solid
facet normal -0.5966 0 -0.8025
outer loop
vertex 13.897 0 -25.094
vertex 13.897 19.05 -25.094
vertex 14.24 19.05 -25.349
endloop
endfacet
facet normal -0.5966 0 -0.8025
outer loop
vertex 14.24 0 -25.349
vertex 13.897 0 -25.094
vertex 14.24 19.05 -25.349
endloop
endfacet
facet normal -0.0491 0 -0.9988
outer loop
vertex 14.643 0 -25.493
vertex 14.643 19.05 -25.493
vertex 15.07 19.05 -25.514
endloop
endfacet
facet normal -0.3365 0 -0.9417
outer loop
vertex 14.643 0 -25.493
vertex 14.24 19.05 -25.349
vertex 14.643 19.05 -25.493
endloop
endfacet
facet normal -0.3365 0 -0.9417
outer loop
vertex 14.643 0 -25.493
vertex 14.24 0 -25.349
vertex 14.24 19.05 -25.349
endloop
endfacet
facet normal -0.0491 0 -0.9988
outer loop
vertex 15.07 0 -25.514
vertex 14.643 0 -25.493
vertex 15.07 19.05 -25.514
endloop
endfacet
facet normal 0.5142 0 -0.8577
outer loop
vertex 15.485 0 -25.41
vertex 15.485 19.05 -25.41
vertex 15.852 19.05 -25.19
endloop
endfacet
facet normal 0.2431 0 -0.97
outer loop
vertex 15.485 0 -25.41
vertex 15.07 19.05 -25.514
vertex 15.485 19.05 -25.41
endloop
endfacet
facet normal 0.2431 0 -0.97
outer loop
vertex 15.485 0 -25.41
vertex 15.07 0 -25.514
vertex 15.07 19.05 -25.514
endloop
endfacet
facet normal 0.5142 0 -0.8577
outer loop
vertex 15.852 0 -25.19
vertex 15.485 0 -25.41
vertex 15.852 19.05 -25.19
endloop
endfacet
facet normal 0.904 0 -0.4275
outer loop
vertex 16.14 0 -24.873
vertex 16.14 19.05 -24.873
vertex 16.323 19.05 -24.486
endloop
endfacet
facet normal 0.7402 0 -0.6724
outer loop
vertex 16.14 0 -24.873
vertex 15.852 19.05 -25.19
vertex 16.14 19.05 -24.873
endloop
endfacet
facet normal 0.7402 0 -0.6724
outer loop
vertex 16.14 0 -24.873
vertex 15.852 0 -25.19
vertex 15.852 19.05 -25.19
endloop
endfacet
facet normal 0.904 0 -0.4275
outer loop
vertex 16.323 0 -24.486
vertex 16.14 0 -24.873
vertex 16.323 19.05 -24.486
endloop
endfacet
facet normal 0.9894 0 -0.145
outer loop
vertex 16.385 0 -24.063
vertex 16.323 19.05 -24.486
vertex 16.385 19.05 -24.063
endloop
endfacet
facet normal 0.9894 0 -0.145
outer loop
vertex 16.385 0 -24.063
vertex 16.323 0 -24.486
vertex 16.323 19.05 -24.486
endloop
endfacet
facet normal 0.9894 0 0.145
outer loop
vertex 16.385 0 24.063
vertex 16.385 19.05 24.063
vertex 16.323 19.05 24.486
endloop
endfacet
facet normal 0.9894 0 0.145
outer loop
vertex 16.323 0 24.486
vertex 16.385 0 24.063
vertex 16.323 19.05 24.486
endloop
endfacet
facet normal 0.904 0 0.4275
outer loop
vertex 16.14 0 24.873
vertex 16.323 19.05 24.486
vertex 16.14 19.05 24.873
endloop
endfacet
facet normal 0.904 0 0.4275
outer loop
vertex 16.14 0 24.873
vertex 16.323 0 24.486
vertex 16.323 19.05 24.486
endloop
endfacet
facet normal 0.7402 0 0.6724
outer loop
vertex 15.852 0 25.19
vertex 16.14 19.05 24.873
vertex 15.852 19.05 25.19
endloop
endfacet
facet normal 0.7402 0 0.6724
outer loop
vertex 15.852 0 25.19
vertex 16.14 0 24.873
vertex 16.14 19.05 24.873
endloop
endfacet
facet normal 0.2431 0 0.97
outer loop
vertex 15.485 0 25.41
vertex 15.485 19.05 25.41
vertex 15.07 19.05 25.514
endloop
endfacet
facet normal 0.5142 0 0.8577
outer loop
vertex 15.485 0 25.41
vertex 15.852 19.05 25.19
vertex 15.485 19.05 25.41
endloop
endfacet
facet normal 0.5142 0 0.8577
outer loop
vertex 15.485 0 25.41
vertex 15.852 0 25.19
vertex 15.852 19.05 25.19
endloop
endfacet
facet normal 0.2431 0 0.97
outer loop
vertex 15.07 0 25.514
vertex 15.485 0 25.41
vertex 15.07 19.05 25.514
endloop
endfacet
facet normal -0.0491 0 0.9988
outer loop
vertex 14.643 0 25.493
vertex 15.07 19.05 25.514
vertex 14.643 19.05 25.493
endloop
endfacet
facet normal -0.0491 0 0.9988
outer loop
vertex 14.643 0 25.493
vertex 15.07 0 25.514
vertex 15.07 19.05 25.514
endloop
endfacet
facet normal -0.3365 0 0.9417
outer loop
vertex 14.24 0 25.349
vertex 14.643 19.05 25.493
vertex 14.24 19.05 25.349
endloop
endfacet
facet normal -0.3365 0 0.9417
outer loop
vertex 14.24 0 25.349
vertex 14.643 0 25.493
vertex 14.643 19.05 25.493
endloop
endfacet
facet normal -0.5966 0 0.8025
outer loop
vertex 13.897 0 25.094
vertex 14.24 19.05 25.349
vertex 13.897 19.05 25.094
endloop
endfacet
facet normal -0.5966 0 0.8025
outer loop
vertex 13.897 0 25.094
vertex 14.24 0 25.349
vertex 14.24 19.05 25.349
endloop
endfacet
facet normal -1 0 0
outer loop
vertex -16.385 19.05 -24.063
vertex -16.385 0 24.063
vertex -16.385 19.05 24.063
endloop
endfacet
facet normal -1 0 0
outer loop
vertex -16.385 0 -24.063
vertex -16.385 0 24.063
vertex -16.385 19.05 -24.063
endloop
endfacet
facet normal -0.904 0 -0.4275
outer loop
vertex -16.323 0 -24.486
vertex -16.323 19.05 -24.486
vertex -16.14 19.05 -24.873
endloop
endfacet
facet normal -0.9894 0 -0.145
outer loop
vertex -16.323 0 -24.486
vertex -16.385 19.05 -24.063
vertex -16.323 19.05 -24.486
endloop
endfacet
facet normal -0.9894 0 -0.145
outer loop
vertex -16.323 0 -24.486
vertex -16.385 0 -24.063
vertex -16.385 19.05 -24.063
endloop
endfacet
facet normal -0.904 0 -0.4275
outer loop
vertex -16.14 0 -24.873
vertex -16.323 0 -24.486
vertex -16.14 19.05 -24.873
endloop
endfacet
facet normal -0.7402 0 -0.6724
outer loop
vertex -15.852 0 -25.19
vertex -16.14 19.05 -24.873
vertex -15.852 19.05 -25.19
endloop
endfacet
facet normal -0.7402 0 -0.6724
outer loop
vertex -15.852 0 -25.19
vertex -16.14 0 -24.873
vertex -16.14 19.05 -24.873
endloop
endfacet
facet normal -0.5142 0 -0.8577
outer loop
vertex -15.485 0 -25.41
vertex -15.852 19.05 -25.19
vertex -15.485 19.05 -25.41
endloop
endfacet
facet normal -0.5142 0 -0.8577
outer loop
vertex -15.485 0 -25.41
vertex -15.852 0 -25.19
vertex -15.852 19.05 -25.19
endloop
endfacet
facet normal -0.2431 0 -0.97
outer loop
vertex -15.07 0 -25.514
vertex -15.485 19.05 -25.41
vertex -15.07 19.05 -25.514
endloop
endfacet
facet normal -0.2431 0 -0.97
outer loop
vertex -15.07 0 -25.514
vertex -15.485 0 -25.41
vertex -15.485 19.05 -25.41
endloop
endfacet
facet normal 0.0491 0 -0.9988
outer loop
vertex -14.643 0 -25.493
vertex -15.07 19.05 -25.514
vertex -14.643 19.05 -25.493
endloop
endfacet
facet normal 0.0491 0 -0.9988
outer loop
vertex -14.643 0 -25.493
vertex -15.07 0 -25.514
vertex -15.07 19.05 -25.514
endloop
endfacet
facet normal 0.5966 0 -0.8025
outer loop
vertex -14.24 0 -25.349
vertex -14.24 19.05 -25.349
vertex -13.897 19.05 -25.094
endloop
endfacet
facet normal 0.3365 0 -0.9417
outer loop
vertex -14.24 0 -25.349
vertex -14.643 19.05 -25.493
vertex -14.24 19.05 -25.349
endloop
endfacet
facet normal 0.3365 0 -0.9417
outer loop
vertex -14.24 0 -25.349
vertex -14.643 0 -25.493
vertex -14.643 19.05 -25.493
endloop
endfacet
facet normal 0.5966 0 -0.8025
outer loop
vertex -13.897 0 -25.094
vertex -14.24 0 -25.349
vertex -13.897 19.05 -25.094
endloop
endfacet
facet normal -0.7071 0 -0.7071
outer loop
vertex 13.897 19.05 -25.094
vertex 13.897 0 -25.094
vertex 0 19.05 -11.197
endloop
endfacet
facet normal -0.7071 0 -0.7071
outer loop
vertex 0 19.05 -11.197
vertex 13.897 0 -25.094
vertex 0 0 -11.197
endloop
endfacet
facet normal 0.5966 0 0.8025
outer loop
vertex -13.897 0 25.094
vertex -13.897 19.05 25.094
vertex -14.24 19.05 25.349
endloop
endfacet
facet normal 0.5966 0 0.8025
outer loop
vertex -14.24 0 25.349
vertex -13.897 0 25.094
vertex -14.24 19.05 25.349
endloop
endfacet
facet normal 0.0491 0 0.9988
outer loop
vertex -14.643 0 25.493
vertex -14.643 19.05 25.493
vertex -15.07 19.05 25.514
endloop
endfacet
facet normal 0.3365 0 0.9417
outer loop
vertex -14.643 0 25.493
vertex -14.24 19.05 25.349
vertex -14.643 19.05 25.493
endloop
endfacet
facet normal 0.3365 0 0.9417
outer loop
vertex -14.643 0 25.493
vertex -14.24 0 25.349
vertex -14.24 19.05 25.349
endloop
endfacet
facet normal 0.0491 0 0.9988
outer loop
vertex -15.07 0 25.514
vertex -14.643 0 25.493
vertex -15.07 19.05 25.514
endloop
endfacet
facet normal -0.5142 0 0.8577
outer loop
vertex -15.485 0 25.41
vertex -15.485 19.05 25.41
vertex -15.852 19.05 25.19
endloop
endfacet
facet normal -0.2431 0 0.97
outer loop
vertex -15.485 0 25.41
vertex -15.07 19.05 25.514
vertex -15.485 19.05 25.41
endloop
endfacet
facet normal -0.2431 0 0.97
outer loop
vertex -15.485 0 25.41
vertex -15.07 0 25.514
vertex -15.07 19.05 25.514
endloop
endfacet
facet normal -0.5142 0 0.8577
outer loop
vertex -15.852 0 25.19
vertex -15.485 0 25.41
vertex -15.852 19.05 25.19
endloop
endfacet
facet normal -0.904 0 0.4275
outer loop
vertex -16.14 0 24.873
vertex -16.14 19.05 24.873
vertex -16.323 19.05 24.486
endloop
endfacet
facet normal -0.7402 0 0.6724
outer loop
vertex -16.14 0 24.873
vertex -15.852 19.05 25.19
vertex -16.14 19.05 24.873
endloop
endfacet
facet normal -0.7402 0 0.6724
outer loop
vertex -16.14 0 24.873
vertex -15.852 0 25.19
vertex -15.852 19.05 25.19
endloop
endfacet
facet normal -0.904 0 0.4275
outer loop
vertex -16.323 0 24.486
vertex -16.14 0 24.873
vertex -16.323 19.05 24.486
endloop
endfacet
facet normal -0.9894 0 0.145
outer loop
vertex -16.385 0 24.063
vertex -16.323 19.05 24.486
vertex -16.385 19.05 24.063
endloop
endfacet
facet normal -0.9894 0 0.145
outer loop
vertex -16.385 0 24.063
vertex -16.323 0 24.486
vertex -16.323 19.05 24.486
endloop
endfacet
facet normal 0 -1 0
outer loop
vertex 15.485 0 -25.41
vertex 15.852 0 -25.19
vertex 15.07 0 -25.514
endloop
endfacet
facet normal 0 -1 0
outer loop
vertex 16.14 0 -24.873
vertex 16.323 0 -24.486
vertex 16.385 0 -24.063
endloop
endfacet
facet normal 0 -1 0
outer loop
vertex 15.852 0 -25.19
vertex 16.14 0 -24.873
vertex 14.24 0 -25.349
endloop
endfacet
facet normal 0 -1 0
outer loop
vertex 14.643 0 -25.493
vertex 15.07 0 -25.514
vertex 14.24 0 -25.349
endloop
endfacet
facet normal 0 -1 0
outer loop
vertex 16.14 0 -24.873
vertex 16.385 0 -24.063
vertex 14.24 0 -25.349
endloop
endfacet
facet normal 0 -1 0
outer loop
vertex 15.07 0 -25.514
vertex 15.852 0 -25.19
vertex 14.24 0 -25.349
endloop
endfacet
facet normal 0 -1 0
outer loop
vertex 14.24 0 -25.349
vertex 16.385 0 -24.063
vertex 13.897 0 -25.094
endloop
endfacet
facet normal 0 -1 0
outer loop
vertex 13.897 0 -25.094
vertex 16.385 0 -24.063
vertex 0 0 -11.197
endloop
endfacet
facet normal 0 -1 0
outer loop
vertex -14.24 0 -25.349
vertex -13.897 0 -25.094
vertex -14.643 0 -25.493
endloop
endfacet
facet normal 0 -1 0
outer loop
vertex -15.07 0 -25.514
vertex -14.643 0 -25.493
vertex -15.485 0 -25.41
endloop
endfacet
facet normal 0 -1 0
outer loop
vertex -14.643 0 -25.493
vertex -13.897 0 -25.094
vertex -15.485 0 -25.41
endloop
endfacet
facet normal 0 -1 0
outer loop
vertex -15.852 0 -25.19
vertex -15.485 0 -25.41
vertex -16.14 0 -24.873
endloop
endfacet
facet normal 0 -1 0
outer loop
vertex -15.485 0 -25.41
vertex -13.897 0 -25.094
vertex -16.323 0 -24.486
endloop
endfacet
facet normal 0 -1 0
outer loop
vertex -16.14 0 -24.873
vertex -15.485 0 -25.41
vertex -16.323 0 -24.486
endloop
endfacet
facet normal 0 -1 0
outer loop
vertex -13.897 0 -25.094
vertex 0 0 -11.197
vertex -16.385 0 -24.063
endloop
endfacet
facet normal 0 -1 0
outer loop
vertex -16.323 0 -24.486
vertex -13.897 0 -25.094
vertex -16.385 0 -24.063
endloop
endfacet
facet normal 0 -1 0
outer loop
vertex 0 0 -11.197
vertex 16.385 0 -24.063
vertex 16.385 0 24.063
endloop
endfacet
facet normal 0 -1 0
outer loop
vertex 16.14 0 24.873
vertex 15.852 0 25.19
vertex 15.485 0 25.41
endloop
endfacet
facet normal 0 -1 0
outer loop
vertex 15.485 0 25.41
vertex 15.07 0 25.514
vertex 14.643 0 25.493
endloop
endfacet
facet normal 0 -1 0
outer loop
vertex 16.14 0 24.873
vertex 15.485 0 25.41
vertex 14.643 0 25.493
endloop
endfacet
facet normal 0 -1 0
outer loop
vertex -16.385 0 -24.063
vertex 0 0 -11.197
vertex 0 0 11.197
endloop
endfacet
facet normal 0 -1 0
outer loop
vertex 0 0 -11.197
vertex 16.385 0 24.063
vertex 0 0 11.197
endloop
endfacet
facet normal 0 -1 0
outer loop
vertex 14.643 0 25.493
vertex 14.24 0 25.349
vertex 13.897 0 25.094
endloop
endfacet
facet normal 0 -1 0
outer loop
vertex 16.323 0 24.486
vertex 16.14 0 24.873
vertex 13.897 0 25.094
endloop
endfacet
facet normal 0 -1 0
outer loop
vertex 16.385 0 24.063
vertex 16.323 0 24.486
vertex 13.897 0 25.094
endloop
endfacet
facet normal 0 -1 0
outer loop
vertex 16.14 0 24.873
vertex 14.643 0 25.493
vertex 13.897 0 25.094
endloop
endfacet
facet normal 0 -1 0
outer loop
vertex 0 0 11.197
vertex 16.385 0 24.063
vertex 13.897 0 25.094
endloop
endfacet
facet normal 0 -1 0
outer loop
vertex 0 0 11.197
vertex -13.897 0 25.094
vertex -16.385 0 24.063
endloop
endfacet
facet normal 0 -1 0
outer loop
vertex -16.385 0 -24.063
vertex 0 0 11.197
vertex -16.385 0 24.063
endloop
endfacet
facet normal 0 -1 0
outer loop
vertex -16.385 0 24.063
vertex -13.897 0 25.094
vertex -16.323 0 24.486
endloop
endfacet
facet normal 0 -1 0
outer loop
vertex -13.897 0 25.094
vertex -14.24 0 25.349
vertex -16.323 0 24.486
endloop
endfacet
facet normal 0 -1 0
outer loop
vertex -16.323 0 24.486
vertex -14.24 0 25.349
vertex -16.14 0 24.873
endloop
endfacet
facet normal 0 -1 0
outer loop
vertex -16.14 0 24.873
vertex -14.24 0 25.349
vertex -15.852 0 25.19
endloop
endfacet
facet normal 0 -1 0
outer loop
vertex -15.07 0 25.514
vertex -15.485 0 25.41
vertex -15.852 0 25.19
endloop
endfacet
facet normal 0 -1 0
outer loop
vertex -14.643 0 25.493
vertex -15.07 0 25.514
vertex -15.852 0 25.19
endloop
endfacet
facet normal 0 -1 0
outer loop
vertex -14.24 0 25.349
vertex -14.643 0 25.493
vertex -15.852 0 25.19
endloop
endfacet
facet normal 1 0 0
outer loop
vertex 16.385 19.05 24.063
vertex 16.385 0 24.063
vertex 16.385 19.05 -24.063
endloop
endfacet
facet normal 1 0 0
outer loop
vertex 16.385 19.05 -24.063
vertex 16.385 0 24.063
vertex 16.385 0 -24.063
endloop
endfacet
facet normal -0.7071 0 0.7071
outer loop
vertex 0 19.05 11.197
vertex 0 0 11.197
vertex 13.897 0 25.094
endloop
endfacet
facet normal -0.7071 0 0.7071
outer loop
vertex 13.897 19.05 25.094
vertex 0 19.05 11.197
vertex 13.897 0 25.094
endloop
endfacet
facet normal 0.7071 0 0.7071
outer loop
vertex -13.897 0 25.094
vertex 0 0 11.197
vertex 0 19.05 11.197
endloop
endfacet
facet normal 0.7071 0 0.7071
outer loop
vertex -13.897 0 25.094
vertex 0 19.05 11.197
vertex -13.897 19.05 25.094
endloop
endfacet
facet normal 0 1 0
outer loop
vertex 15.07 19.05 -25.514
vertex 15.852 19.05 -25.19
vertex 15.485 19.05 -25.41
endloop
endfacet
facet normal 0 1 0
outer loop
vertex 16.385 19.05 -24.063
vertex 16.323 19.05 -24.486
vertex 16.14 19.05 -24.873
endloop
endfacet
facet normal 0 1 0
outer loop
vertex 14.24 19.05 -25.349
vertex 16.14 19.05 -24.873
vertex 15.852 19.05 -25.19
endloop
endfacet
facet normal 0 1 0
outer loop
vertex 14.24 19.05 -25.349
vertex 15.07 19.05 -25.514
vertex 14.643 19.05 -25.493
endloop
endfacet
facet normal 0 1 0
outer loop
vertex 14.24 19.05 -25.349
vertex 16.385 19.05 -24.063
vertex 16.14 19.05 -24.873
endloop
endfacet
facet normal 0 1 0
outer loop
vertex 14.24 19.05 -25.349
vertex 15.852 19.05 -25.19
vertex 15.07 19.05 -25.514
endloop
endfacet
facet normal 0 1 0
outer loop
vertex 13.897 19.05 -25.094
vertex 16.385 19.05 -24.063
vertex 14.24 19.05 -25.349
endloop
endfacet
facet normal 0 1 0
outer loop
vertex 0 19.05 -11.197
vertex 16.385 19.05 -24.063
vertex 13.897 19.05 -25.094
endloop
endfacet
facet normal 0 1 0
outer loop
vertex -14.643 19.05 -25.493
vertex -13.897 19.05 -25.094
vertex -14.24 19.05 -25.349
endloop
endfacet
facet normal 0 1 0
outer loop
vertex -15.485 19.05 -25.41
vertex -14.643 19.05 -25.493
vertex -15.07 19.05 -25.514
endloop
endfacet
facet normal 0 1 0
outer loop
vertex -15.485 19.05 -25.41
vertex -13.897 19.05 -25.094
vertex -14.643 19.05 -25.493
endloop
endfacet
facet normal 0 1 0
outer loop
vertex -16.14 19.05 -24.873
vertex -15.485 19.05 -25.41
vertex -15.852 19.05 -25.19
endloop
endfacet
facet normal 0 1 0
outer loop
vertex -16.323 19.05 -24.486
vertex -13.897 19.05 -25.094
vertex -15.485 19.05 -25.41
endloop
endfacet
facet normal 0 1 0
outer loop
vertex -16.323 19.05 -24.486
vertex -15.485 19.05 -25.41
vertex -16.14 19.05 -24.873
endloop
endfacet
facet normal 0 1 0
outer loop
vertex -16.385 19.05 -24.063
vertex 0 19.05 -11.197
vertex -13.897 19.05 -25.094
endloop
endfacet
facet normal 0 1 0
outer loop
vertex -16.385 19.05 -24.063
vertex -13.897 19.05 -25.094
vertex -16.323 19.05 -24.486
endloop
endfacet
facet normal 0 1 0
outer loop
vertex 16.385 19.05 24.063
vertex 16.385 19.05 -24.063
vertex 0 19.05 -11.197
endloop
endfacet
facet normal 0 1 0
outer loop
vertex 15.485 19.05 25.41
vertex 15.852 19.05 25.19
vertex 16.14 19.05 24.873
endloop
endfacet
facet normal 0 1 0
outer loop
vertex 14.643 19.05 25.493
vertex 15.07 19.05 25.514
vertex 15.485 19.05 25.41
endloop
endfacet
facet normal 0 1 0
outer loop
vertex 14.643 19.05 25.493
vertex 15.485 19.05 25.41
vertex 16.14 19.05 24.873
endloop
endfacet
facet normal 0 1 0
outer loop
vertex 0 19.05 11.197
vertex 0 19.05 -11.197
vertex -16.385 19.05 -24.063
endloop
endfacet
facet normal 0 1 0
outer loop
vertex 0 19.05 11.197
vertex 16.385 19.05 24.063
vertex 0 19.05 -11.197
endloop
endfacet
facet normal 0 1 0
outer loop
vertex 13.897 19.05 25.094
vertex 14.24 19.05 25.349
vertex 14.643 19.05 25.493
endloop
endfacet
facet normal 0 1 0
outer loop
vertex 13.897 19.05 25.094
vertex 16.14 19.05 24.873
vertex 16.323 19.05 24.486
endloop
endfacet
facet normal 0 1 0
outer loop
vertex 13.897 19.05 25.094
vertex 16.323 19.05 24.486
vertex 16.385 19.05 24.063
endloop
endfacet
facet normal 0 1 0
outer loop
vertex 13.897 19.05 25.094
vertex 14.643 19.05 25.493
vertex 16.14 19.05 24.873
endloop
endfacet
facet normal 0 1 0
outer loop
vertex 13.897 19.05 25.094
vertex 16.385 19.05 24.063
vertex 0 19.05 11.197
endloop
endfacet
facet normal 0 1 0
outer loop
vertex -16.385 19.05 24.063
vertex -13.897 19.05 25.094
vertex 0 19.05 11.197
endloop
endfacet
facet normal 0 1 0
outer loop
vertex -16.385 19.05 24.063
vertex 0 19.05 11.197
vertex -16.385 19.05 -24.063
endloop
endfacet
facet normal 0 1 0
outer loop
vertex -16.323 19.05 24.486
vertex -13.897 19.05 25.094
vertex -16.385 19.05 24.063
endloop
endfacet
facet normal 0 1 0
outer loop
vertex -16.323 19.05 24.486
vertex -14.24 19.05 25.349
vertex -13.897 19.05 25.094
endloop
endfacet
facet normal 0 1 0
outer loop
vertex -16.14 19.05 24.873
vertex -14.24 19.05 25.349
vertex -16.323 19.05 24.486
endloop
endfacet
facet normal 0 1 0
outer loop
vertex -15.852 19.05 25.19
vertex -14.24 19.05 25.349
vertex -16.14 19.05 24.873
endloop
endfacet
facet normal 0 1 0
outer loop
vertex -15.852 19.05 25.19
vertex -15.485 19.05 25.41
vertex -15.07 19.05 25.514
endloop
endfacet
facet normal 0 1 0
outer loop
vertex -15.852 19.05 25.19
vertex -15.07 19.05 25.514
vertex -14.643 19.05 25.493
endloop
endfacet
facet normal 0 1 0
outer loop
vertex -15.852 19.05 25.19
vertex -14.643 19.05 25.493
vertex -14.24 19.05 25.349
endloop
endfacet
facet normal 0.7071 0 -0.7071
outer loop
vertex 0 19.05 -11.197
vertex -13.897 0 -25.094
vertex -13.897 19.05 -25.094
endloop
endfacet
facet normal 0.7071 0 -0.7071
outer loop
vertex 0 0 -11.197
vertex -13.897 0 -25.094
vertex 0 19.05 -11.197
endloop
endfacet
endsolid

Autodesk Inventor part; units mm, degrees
ref_plane "YZ Plane" through (0, 0, 0) normal (1, 0, 0) x (0, 1, 0)
ref_plane "XZ Plane" through (0, 0, 0) normal (0, 1, 0) x (-1, 0, 0)
ref_plane "XY Plane" through (0, 0, 0) normal (0, 0, 1) x (1, 0, 0)
sketch "Sketch1" plane through (0, 0, 0) normal (0, 1, 0) x (-1, 0, 0)
  line L0 (16.5354, 24.0815) -> (16.5354, -24.0815)
  arc A0 (16.5354, 24.0815) -> (13.8037, 25.213) centre (14.9352, 24.0815) ccw
  line L1 (0, 11.4094) -> (13.8037, 25.213)
  line L2 (0, -11.4094) -> (0, 11.4094)
  line L3 (13.8037, -25.213) -> (0, -11.4094)
  arc A1 (13.8037, -25.213) -> (16.5354, -24.0815) centre (14.9352, -24.0815) ccw
  line L4 (-16.5354, 24.0815) -> (-16.5354, -24.0815)
  arc A2 (-13.8037, 25.213) -> (-16.5354, 24.0815) centre (-14.9352, 24.0815) ccw
  line L5 (0, 11.4094) -> (-13.8037, 25.213)
  line L6 (-13.8037, -25.213) -> (0, -11.4094)
  arc A3 (-16.5354, -24.0815) -> (-13.8037, -25.213) centre (-14.9352, -24.0815) ccw
  line L7 (16.3854, 24.063) -> (16.3854, -24.063)
  arc A4 (16.3854, 24.063) -> (13.8967, 25.0939) centre (14.9275, 24.063) ccw
  line L8 (0, 11.1972) -> (13.8967, 25.0939)
  line L9 (0, -11.1972) -> (0, 11.1972)
  line L10 (13.8967, -25.0939) -> (0, -11.1972)
  arc A5 (13.8967, -25.0939) -> (16.3854, -24.063) centre (14.9275, -24.063) ccw
  line L11 (-16.3854, 24.063) -> (-16.3854, -24.063)
  arc A6 (-13.8967, 25.0939) -> (-16.3854, 24.063) centre (-14.9275, 24.063) ccw
  line L12 (0, 11.1972) -> (-13.8967, 25.0939)
  line L13 (-13.8967, -25.0939) -> (0, -11.1972)
  arc A7 (-16.3854, -24.063) -> (-13.8967, -25.0939) centre (-14.9275, -24.063) ccw
  point P0 (0, 0)
  point P1 (0, 0)
  point P2 (0, 0)
  point P3 (15.5476, -25.5599)
  point P4 (15.4854, -25.4099)
  dimension "d3" = 1.6002
  dimension "d4" = 33.0708
  dimension "d5" = 16.1353
  dimension "d6" = 0.15
  dimension "d7" = 0.15
  dimension "d8" = 0.15
extrude "Extrusion1" add sketch "Sketch1" along normal blind 19.05 contours L8 A4 L7 A5 L10 L2 | L2 L13 A7 L11 A6 L12
properties part number "IPT_Dovetail_Connecter" material "Acetal Resin, Black"
